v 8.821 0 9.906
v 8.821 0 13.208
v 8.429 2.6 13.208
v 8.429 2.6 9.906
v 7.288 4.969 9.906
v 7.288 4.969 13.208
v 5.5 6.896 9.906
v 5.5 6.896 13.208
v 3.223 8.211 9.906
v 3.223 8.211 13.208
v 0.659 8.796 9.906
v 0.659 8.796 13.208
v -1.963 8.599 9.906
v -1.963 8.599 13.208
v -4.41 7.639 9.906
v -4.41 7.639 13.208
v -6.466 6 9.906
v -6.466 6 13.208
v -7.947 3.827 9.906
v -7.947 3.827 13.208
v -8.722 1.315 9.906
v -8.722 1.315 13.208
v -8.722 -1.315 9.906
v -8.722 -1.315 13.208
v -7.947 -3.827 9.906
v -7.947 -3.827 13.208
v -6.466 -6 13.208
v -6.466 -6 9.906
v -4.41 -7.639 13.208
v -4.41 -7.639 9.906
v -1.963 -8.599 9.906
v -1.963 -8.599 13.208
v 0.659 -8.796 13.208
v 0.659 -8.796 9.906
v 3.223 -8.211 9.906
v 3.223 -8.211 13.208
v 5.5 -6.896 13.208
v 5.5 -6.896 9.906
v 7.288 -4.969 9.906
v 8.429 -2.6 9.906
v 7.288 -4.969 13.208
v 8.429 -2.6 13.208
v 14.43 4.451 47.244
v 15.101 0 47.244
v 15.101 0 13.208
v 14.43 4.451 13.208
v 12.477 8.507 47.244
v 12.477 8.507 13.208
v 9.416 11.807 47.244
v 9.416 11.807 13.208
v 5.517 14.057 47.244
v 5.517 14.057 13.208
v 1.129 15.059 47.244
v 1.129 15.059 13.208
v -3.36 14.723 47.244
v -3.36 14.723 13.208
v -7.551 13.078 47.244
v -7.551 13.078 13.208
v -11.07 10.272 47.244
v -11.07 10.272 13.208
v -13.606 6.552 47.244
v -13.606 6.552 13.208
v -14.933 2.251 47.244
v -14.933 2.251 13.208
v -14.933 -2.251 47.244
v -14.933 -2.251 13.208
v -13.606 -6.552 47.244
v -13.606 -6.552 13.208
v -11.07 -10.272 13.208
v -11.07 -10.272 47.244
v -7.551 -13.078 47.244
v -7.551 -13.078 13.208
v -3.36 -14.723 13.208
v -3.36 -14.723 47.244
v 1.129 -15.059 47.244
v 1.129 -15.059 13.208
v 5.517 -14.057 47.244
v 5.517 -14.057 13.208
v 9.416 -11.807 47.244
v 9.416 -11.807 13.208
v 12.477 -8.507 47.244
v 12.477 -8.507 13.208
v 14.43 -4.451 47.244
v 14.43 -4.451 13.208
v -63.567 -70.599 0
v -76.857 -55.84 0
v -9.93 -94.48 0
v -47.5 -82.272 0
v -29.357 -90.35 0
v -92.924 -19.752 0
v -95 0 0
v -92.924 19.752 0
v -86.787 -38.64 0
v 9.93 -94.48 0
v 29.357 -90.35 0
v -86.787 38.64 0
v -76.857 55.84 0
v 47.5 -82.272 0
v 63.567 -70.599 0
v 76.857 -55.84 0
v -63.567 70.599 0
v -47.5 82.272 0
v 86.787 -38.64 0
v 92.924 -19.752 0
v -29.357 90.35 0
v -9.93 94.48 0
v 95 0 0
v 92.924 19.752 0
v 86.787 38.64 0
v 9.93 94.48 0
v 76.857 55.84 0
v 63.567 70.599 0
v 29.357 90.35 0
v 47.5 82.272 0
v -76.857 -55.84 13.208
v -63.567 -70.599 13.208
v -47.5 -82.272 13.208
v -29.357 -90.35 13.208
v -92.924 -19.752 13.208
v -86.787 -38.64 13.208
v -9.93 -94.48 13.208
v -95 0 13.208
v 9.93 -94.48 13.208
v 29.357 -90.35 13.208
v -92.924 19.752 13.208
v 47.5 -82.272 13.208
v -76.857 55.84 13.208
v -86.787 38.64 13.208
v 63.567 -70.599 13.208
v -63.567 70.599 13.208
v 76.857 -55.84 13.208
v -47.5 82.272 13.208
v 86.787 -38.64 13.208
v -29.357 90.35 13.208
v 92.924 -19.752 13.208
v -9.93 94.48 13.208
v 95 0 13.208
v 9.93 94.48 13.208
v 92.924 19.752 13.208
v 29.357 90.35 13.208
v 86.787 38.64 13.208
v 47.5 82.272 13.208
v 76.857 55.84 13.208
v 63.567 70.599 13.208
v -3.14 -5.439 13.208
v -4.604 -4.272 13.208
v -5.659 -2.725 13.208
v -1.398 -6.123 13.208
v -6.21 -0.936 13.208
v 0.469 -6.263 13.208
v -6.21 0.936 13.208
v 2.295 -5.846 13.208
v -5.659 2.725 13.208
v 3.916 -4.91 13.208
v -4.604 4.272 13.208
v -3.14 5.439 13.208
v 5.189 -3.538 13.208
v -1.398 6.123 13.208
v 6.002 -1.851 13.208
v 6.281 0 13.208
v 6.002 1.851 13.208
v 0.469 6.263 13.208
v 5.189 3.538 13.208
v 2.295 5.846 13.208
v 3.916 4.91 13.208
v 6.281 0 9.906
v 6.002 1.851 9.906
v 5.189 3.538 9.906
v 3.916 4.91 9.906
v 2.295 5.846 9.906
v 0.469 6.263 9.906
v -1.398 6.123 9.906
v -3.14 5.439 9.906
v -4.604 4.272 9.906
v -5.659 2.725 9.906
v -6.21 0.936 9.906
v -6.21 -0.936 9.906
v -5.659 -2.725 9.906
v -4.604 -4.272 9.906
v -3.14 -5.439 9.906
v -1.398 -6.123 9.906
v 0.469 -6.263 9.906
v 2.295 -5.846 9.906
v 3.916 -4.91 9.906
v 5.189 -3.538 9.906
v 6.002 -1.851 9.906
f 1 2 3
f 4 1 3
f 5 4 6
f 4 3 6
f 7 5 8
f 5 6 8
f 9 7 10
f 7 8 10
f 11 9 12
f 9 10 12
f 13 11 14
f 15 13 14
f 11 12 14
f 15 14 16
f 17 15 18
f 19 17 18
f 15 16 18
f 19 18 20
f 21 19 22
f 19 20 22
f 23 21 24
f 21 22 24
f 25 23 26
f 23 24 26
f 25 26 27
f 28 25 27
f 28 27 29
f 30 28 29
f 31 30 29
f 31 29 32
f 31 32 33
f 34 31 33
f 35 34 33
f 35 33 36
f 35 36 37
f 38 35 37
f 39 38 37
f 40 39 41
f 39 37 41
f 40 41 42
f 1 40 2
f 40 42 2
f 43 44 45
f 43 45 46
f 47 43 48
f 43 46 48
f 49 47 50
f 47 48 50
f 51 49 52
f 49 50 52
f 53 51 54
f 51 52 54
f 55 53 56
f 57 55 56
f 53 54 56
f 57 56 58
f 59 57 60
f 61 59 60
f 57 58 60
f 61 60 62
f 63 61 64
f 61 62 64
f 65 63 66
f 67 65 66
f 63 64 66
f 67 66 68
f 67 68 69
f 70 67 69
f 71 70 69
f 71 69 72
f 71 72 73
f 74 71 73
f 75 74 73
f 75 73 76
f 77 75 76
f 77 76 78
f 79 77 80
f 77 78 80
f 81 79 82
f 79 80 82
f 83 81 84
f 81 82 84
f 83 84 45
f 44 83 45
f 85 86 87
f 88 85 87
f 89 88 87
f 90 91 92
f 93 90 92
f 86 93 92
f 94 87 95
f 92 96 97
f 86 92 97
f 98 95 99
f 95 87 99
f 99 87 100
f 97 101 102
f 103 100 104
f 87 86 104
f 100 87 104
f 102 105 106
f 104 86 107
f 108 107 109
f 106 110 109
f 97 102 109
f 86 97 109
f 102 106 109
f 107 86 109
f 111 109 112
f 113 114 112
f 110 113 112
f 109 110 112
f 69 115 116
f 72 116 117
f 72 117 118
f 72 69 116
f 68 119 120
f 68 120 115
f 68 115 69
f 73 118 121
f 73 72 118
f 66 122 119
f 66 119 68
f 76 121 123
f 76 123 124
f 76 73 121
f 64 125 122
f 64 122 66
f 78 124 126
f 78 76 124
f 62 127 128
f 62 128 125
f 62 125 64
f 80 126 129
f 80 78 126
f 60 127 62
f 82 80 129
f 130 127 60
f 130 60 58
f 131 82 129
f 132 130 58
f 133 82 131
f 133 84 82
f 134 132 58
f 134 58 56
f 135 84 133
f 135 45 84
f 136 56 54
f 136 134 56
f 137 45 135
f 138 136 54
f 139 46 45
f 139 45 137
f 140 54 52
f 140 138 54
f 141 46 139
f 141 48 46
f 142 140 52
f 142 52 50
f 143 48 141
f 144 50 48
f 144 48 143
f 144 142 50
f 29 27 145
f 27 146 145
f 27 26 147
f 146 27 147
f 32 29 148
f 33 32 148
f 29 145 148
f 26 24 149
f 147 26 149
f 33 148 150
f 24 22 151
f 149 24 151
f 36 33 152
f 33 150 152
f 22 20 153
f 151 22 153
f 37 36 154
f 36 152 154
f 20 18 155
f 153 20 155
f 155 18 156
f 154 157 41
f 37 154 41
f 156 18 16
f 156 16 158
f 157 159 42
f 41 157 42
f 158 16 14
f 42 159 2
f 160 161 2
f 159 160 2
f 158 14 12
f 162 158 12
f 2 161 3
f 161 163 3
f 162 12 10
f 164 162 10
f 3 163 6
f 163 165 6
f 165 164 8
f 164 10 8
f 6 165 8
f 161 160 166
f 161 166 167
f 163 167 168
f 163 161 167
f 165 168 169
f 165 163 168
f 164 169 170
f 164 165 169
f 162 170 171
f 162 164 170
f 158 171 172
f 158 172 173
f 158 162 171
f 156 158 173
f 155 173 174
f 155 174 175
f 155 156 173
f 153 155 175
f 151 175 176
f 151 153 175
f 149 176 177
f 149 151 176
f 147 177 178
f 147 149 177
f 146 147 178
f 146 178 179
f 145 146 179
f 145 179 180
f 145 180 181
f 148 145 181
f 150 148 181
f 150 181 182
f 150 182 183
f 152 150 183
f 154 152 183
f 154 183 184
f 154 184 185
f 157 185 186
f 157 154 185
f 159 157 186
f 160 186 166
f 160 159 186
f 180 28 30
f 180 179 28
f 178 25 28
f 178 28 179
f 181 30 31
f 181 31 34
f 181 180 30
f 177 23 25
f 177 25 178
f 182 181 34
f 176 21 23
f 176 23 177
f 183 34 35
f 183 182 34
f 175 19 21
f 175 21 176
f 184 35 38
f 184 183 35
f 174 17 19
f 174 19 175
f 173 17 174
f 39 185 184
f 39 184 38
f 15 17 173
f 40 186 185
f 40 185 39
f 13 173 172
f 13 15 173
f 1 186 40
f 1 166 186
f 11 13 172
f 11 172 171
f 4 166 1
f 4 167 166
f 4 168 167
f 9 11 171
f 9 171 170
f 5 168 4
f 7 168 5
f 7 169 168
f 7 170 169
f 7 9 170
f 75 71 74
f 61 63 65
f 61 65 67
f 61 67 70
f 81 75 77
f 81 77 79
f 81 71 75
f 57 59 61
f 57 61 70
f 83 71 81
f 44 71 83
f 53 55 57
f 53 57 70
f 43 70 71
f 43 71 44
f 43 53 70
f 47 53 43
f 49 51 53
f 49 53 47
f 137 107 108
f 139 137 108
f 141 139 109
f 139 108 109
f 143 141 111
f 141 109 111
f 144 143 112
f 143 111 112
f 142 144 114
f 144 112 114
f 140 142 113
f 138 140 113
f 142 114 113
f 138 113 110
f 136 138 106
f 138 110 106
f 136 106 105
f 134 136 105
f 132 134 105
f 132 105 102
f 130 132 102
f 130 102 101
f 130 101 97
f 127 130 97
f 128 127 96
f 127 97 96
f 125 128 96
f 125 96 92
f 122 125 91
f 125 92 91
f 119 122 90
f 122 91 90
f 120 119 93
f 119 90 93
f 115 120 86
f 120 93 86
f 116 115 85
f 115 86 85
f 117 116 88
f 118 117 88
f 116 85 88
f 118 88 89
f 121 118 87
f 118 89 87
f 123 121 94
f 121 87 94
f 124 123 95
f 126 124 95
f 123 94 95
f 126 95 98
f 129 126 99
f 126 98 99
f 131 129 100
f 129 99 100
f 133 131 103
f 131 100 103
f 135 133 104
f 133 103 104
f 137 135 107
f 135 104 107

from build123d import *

# Parameters (mm, degrees)
SKETCH_1_R          = 95
EXTRUDE_1_DEPTH     = 13.208
SKETCH_2_R          = 8.820632657
SKETCH_2_R_2        = 6.280632657
CUT_EXTRUDE_1_DEPTH = 3.302
SKETCH_3_R          = 15.1013679
EXTRUDE_2_DEPTH     = 34.036


with BuildPart() as part:
    # 草图1 → 凸台-拉伸1 (new body)
    with BuildSketch(Plane.XY):
        Circle(SKETCH_1_R)
    extrude(amount=EXTRUDE_1_DEPTH)

    # 草图2 → 切除-拉伸1 (cut)
    with BuildSketch(Plane.XY.offset(13.208)):
        Circle(SKETCH_2_R)
        Circle(SKETCH_2_R_2, mode=Mode.SUBTRACT)
    extrude(amount=-CUT_EXTRUDE_1_DEPTH, mode=Mode.SUBTRACT)

    # 草图3 → 凸台-拉伸2 (add)
    with BuildSketch(Plane.XY.offset(13.208)):
        Circle(SKETCH_3_R)
    extrude(amount=EXTRUDE_2_DEPTH)


solid = part.part
